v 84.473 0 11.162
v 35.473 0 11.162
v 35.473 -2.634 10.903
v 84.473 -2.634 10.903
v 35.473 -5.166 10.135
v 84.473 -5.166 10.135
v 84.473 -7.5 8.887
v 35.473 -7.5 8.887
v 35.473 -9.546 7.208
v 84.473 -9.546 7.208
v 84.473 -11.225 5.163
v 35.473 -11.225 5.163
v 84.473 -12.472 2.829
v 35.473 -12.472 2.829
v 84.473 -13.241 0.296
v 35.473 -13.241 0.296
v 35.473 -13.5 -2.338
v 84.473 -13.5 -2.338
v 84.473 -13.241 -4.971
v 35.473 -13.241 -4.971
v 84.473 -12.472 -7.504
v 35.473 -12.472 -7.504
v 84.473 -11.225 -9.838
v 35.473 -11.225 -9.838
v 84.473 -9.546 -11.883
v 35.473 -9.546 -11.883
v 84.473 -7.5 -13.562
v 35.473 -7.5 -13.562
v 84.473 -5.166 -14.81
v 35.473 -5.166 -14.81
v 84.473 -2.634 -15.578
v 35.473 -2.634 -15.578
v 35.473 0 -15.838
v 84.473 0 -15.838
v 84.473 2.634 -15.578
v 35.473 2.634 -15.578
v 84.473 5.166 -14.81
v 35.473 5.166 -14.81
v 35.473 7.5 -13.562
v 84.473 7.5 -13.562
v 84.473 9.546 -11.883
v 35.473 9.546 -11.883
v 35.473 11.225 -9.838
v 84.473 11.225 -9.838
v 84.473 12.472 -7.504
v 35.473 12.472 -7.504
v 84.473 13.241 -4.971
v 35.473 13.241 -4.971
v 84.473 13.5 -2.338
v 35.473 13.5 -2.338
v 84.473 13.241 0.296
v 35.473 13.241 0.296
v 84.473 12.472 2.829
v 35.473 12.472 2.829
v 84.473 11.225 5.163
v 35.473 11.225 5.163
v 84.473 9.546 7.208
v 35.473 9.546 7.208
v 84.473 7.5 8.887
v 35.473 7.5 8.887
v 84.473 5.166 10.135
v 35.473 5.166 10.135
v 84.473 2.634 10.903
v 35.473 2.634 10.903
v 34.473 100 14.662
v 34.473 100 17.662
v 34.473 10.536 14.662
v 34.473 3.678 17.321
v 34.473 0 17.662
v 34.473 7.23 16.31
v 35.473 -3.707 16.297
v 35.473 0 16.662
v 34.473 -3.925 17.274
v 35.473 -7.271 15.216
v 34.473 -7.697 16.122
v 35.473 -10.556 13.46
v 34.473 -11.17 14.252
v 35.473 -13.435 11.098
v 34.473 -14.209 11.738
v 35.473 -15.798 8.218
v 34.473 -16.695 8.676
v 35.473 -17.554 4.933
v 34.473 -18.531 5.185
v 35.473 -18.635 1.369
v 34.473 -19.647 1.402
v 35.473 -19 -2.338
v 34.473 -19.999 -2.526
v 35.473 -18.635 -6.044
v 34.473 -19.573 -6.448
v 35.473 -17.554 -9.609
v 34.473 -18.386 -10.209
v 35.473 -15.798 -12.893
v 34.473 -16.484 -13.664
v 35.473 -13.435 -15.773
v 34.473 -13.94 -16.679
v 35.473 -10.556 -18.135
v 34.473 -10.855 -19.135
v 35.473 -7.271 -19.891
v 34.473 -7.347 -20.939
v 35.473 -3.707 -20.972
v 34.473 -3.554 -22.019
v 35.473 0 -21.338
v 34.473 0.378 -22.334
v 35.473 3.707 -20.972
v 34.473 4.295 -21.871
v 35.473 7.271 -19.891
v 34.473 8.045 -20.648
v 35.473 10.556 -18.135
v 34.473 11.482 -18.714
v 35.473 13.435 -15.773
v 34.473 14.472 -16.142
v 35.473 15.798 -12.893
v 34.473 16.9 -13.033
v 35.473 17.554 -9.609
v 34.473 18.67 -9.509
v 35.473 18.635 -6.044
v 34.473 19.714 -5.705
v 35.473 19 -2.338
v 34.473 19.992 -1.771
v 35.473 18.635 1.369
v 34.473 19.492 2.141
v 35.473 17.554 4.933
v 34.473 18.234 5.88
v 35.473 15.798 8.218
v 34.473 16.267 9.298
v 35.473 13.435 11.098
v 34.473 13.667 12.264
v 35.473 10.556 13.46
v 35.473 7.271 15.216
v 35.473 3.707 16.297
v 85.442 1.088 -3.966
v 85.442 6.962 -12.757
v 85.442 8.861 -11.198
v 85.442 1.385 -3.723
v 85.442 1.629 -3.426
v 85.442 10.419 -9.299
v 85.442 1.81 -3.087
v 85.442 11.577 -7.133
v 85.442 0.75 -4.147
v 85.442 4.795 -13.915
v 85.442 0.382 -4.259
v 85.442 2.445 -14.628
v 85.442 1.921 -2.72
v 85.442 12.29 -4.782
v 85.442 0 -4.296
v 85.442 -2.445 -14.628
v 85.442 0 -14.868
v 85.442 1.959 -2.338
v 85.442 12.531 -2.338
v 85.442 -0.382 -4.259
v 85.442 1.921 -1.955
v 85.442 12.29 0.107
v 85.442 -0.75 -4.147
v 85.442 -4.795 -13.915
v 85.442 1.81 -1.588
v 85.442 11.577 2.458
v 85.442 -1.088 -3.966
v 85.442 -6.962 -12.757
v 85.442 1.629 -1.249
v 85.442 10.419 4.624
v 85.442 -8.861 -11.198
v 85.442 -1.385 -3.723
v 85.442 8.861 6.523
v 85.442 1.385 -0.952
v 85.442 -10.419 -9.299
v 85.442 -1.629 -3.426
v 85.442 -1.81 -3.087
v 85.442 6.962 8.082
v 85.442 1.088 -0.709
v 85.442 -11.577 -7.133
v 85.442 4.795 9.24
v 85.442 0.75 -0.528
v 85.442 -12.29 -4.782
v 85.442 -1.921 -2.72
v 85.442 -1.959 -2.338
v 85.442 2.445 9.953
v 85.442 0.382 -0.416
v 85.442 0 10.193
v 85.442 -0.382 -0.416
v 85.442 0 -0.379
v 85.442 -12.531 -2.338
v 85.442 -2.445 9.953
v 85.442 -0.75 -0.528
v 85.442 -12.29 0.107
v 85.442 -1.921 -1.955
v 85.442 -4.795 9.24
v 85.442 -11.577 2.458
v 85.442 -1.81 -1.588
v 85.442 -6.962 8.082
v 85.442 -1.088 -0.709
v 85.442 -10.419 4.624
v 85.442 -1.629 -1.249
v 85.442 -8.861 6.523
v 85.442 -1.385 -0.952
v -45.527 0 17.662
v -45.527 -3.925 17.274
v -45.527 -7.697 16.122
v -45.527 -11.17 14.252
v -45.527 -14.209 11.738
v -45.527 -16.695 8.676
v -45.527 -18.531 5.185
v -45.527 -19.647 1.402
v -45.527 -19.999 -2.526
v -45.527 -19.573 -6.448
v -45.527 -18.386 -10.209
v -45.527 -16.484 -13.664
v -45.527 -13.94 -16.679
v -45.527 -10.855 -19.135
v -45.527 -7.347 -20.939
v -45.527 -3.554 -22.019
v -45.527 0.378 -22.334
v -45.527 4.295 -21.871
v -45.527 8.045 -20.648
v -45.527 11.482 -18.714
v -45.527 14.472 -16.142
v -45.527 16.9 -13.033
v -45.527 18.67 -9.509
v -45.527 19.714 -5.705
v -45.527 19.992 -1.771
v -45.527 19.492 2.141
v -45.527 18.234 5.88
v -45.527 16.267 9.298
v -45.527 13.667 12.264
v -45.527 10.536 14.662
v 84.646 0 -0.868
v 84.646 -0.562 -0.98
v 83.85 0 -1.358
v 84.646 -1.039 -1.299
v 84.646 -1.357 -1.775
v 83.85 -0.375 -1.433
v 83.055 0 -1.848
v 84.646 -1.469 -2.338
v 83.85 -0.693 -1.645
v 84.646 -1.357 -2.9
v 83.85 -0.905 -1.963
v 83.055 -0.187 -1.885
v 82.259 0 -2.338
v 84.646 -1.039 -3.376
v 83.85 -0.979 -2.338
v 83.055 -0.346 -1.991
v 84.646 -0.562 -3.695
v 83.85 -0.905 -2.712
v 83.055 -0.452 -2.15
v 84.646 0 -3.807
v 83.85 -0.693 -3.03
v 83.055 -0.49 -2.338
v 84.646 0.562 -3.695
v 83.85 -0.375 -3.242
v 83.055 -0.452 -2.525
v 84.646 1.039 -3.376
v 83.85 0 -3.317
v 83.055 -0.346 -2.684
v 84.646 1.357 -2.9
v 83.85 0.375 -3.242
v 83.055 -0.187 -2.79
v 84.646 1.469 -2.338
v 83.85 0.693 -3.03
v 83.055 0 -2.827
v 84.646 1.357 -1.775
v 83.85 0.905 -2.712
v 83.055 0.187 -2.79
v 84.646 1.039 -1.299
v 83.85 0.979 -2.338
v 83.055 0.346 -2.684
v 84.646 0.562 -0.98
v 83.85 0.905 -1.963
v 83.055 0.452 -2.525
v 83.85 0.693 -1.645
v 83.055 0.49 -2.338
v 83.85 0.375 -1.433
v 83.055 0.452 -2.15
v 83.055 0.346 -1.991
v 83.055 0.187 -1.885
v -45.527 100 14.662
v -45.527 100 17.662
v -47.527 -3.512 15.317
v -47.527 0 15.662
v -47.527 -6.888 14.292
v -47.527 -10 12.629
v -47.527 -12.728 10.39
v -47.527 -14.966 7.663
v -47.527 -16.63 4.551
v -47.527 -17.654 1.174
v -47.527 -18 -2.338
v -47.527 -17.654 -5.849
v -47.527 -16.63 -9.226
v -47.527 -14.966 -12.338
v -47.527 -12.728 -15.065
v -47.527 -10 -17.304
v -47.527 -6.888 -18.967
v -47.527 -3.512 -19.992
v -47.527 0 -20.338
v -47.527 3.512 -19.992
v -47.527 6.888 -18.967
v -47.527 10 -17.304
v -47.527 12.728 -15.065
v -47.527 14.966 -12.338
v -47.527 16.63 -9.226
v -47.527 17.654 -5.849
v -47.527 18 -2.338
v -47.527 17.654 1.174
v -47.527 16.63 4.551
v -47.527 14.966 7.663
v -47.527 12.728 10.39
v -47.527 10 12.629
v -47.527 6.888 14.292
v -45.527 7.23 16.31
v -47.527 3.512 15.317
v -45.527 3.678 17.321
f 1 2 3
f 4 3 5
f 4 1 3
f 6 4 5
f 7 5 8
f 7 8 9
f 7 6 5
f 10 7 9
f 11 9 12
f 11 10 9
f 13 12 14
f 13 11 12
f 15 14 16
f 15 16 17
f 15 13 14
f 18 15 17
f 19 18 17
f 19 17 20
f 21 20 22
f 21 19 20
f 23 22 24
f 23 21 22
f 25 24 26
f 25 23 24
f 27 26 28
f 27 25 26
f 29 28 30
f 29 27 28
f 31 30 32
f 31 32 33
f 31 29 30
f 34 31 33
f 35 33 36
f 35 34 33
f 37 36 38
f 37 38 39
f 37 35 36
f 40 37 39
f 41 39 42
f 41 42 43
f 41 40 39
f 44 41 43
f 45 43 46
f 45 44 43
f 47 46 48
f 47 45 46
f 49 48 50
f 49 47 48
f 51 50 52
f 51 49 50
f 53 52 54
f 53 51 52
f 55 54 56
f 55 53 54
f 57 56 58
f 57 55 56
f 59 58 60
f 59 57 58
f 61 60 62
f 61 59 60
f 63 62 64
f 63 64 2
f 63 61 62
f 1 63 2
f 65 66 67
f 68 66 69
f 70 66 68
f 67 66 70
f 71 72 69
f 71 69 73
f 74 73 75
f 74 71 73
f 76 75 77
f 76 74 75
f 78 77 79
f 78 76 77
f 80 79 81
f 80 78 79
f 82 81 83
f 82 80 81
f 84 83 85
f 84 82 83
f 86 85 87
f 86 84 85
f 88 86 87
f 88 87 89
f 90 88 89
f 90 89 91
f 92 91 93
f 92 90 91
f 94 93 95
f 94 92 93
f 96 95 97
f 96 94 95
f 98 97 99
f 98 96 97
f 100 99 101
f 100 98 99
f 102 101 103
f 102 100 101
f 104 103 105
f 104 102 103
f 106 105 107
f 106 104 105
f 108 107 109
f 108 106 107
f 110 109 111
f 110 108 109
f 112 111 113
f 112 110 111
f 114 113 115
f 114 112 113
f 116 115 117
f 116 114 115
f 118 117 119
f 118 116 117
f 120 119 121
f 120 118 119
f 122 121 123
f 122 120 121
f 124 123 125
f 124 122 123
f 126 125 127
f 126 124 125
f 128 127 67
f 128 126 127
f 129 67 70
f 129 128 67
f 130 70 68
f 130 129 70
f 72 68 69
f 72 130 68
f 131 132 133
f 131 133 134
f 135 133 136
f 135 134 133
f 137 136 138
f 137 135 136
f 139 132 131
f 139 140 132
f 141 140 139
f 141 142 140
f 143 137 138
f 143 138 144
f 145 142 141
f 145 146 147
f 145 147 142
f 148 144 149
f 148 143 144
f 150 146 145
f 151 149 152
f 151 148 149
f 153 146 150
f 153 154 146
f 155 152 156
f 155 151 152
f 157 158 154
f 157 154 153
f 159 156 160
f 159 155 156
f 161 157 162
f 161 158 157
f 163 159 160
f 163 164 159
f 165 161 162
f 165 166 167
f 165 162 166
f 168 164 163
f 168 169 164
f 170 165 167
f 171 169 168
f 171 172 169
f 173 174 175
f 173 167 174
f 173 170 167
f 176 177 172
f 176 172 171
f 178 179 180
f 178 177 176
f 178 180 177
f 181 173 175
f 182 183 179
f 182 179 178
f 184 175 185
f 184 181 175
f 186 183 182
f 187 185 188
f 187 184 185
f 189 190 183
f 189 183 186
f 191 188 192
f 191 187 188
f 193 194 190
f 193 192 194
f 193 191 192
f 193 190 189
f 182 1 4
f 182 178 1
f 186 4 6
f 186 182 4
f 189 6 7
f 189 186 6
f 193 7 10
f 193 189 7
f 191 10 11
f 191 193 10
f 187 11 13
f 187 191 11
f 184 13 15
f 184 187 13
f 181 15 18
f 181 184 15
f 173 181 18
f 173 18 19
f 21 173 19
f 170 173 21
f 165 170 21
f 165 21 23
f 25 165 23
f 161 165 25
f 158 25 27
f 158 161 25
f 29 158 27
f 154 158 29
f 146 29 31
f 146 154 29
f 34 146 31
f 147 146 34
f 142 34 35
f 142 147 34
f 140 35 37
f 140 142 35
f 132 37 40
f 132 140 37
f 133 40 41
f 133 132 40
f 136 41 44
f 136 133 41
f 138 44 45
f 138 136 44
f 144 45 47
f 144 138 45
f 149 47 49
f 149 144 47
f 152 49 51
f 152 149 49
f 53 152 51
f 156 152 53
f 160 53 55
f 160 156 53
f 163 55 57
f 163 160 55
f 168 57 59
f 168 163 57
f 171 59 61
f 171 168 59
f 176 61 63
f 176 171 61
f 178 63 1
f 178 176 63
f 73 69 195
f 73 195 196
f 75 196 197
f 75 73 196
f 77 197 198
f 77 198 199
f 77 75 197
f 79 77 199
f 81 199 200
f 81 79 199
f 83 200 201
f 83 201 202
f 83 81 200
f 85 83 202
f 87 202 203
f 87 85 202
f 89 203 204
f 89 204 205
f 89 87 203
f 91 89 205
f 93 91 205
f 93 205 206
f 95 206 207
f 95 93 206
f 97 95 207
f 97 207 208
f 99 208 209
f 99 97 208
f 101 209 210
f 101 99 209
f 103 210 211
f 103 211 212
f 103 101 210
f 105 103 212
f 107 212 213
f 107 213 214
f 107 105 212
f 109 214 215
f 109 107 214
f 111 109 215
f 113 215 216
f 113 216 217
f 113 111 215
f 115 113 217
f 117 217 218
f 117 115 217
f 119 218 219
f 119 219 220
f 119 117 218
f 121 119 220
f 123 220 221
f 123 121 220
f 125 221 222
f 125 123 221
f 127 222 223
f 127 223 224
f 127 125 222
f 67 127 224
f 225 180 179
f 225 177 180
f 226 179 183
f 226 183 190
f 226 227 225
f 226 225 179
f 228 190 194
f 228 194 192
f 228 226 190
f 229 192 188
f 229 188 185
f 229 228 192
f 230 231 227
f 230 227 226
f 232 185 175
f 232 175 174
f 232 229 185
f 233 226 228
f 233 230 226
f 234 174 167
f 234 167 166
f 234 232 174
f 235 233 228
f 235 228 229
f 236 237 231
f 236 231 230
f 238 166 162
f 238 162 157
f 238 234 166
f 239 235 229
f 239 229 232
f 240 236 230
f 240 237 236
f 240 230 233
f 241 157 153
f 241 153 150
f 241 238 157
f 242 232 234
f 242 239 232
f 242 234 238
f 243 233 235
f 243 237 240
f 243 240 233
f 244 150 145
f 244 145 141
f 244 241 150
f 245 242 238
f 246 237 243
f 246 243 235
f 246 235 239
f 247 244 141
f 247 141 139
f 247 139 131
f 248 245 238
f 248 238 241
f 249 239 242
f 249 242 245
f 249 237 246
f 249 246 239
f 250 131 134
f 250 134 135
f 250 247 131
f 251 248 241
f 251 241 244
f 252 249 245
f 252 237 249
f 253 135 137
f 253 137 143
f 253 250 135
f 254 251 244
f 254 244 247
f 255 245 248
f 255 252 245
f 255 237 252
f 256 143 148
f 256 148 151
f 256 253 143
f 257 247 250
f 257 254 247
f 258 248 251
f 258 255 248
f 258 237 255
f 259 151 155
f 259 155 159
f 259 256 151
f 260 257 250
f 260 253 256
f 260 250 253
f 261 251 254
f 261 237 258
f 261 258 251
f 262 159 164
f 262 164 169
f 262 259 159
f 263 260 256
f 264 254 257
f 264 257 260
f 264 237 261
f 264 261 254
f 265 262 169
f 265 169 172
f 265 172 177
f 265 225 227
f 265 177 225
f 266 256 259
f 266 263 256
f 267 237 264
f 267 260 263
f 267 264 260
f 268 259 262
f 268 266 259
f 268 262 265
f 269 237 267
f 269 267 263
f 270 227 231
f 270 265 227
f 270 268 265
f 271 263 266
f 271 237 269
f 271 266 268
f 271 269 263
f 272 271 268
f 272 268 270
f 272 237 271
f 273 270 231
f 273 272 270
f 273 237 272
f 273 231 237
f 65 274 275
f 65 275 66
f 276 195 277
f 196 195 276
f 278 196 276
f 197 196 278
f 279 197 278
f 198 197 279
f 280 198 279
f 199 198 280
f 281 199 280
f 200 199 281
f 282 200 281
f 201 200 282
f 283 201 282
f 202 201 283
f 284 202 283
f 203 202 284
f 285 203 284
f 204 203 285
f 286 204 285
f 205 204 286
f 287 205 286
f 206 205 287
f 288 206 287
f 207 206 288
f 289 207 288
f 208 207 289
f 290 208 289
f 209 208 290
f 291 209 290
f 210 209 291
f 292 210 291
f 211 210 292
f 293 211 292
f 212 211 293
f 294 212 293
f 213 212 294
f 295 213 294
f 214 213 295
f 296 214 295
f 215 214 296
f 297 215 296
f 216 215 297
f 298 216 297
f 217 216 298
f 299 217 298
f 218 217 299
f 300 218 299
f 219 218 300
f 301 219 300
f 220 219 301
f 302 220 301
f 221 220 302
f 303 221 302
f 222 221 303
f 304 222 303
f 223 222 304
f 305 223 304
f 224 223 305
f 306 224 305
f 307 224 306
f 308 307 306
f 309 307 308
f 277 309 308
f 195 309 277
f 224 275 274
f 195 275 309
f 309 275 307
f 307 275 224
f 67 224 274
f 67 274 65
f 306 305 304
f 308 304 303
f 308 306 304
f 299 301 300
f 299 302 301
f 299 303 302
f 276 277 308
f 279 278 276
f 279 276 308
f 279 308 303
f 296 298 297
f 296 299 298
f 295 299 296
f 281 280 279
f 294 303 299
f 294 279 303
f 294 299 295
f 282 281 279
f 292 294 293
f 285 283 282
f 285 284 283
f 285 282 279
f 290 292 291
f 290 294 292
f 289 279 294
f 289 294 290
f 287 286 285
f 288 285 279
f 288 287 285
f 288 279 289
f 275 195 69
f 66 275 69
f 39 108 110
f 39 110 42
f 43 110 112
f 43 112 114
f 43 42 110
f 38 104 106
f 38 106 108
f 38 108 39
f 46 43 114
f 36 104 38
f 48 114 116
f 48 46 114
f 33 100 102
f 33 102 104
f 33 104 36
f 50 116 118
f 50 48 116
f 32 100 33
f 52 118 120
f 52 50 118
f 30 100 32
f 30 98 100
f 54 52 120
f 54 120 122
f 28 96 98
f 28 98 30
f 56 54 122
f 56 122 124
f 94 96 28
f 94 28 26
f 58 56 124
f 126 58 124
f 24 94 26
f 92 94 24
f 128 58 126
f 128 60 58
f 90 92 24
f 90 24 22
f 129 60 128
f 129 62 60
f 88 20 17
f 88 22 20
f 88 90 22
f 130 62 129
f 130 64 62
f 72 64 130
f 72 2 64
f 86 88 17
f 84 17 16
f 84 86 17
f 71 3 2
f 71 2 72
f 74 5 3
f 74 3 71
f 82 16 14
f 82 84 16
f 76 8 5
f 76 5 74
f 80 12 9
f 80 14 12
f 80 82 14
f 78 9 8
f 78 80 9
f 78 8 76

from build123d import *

# Parameters (mm, degrees)
SKETCH_3_W      = 80
SKETCH_3_H      = 3.000052495
EXTRUDE_1_DEPTH = 100


with BuildPart() as part:
    # Эскиз2 → Повернуть1 (revolve)
    with BuildSketch(Plane(origin=(0, 0, 0), x_dir=(1, 0, 0), z_dir=(0, 1, 0)), mode=Mode.PRIVATE) as revolve_1_sk:
        Polygon((-45.527497303, 22.337527379), (34.472502697, 22.337527379), (35.472502697, 21.337527379), (35.472502697, 15.837527379), (84.472502697, 15.837527379), (85.441558376, 14.8684717), (85.441558376, 4.296423316), (82.259183132, 2.337527379), (-47.527497303, 2.337527379), (-47.527497303, 20.337527379), align=None)
    revolve(revolve_1_sk.sketch.rotate(Axis((-58.608041749, 0, -2.337527379), (1, 0, 0)), 180), axis=Axis((-58.608041749, 0, -2.337527379), (1, 0, 0)))

    # Эскиз3 → Бобышка-Вытянуть1 (add)
    with BuildSketch(Plane(origin=(0, 0, 0), x_dir=(1, 0, 0), z_dir=(0, 1, 0))):
        with Locations((-5.527497303, -16.162446374)):
            Rectangle(SKETCH_3_W, SKETCH_3_H)
    extrude(amount=EXTRUDE_1_DEPTH)


solid = part.part
